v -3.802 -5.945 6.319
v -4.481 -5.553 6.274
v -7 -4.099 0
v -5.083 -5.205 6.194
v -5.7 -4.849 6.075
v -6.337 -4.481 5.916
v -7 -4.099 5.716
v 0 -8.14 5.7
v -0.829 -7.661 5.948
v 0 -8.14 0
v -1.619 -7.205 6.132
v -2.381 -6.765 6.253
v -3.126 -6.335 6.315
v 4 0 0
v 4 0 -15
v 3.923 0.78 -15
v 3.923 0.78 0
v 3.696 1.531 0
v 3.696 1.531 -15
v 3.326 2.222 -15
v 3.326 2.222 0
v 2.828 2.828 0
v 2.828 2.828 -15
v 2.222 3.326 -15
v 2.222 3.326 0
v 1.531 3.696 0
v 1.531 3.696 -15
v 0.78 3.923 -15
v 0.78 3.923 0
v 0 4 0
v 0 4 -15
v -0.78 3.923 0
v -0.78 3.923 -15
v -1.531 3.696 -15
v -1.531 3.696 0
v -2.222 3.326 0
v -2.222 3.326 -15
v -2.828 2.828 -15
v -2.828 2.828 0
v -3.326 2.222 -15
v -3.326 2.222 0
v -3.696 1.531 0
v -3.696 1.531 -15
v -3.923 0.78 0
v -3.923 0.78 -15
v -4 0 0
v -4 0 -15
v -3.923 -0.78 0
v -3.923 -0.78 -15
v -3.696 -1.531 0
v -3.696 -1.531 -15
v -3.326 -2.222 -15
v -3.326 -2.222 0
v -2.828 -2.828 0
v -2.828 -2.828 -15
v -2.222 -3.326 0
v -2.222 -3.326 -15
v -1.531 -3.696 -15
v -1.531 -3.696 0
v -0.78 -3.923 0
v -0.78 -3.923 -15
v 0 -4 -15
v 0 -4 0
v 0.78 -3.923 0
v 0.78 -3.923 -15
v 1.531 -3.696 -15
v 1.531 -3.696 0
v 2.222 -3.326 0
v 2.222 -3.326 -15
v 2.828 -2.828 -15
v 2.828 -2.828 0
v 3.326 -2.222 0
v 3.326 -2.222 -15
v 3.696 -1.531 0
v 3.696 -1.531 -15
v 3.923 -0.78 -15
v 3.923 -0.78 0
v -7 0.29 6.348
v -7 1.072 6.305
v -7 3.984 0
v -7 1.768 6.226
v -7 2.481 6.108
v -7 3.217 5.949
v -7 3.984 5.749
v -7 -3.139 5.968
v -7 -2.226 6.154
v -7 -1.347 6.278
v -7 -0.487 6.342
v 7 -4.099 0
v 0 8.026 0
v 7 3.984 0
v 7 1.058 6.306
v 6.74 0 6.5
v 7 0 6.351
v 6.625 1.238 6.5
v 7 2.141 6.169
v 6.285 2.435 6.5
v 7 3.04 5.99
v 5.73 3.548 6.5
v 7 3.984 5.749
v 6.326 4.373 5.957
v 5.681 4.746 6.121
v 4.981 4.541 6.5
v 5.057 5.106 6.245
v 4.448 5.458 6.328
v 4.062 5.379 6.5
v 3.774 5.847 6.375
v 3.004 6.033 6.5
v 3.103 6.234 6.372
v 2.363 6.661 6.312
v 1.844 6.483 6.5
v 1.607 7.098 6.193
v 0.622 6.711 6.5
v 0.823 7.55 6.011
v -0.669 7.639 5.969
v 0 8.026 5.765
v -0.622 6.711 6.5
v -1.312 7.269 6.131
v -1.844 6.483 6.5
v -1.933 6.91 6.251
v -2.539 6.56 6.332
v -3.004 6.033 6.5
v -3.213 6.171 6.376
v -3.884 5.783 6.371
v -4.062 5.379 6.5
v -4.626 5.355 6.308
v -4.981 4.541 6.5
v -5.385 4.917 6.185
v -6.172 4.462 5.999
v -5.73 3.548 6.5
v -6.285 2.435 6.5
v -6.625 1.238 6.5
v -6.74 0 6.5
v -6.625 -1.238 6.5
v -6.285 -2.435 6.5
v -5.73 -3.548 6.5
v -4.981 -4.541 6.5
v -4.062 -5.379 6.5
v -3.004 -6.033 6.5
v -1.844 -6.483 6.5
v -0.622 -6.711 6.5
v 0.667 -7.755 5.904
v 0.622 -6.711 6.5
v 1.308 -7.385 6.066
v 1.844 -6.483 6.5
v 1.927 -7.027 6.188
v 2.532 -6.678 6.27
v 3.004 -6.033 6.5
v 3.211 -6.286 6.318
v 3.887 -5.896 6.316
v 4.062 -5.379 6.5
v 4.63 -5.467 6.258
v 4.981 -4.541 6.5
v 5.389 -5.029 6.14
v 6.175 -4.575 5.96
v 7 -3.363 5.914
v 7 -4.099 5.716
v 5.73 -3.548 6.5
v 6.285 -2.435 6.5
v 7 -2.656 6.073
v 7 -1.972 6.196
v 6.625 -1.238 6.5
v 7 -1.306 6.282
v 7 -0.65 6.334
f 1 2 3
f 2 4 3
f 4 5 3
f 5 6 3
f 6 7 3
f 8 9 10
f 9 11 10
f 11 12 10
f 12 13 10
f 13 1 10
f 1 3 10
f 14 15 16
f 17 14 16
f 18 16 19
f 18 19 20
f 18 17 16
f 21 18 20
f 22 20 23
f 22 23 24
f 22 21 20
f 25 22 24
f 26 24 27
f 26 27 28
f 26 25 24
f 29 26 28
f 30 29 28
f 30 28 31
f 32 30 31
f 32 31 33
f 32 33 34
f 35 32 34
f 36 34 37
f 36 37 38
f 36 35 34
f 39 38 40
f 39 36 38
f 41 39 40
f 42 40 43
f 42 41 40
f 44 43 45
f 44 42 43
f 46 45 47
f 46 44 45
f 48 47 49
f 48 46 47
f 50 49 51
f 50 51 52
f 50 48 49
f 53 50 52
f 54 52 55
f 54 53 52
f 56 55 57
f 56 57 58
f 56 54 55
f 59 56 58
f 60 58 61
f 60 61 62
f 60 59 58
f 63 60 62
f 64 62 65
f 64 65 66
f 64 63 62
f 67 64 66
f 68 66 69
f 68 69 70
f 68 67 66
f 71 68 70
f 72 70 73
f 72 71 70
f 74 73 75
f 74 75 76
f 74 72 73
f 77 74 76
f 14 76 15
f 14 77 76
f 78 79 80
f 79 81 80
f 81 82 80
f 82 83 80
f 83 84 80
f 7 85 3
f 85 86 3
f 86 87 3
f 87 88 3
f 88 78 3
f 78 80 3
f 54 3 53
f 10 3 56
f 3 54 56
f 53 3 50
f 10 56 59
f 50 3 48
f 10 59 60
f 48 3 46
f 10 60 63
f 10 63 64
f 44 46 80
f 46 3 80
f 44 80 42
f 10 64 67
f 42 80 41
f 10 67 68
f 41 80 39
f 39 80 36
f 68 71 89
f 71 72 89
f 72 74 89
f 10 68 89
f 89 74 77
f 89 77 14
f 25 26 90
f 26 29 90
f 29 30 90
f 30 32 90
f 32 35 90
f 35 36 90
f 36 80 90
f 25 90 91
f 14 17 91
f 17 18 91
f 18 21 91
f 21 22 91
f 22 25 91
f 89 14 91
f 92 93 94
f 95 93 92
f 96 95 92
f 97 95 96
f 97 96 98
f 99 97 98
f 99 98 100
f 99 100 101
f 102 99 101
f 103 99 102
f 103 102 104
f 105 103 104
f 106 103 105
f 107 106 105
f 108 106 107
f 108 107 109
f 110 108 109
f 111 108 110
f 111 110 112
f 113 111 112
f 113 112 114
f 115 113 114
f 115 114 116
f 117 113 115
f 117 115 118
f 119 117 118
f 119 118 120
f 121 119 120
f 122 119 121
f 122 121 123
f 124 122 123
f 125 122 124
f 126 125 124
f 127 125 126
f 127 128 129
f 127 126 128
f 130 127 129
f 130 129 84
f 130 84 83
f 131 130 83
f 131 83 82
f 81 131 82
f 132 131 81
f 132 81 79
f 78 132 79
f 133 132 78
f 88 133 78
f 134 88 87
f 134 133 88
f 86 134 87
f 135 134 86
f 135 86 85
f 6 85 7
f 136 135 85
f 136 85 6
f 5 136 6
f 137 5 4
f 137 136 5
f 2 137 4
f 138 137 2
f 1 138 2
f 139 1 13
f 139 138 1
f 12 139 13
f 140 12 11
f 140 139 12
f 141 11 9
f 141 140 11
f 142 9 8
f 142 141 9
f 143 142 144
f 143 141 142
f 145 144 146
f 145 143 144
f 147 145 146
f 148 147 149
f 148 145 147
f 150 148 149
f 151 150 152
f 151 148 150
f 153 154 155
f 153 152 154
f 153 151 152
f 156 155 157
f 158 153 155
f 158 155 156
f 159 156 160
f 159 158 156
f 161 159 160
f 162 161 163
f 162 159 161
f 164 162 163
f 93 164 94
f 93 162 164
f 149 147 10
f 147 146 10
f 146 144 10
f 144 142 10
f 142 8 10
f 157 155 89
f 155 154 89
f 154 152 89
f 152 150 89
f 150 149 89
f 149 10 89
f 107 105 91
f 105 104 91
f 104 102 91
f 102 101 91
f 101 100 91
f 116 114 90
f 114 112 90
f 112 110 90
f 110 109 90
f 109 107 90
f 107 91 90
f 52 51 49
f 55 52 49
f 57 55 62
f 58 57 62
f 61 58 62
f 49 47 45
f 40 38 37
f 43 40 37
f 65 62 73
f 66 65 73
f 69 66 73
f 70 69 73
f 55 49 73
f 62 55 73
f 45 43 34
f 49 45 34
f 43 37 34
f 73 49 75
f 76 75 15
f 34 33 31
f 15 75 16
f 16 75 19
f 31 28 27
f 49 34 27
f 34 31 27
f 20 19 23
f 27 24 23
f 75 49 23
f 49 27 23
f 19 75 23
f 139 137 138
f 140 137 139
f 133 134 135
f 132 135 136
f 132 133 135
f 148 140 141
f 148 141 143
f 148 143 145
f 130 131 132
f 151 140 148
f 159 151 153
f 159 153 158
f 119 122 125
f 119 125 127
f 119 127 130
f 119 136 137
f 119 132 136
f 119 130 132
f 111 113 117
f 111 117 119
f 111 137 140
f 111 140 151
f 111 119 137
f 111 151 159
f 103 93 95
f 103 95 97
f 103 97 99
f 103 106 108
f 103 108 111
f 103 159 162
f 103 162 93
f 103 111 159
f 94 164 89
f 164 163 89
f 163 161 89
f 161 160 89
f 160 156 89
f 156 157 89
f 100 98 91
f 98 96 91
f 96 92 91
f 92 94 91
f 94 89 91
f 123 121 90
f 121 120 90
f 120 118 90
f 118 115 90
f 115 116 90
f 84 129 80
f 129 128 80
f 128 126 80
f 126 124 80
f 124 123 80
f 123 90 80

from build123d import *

# Parameters (mm, degrees)
F0_R     = 4
F1_DEPTH = 15
F3_DEPTH = 6.5


with BuildPart() as f1:
    # F0 (on Top) → F1 (new body)
    with BuildSketch(Plane.XY):
        Circle(F0_R)
    extrude(amount=-F1_DEPTH)

    # F2 (on face) → F3 (join)
    with BuildSketch(Plane.XY):
        Polygon((7, 3.984384), (0, 8.025836), (-7, 3.984384), (-7, -4.098519), (0, -8.139971), (7, -4.098519), align=None)
    extrude(amount=F3_DEPTH)

    # F6: sweep along a path in F5
    with BuildLine(Plane.XY.offset(6.5)) as f6_path:
        CenterArc((0, 0), 8.139971, 0, 360)
    # F4 (on Right) → F6 (sweep, cut)
    with BuildSketch(Plane.YZ):
        Polygon((-8.139971, 5.7), (-6.739971, 6.5), (-8.139971, 6.5), align=None)
    sweep(path=f6_path.line, mode=Mode.SUBTRACT)


solid = f1.part
